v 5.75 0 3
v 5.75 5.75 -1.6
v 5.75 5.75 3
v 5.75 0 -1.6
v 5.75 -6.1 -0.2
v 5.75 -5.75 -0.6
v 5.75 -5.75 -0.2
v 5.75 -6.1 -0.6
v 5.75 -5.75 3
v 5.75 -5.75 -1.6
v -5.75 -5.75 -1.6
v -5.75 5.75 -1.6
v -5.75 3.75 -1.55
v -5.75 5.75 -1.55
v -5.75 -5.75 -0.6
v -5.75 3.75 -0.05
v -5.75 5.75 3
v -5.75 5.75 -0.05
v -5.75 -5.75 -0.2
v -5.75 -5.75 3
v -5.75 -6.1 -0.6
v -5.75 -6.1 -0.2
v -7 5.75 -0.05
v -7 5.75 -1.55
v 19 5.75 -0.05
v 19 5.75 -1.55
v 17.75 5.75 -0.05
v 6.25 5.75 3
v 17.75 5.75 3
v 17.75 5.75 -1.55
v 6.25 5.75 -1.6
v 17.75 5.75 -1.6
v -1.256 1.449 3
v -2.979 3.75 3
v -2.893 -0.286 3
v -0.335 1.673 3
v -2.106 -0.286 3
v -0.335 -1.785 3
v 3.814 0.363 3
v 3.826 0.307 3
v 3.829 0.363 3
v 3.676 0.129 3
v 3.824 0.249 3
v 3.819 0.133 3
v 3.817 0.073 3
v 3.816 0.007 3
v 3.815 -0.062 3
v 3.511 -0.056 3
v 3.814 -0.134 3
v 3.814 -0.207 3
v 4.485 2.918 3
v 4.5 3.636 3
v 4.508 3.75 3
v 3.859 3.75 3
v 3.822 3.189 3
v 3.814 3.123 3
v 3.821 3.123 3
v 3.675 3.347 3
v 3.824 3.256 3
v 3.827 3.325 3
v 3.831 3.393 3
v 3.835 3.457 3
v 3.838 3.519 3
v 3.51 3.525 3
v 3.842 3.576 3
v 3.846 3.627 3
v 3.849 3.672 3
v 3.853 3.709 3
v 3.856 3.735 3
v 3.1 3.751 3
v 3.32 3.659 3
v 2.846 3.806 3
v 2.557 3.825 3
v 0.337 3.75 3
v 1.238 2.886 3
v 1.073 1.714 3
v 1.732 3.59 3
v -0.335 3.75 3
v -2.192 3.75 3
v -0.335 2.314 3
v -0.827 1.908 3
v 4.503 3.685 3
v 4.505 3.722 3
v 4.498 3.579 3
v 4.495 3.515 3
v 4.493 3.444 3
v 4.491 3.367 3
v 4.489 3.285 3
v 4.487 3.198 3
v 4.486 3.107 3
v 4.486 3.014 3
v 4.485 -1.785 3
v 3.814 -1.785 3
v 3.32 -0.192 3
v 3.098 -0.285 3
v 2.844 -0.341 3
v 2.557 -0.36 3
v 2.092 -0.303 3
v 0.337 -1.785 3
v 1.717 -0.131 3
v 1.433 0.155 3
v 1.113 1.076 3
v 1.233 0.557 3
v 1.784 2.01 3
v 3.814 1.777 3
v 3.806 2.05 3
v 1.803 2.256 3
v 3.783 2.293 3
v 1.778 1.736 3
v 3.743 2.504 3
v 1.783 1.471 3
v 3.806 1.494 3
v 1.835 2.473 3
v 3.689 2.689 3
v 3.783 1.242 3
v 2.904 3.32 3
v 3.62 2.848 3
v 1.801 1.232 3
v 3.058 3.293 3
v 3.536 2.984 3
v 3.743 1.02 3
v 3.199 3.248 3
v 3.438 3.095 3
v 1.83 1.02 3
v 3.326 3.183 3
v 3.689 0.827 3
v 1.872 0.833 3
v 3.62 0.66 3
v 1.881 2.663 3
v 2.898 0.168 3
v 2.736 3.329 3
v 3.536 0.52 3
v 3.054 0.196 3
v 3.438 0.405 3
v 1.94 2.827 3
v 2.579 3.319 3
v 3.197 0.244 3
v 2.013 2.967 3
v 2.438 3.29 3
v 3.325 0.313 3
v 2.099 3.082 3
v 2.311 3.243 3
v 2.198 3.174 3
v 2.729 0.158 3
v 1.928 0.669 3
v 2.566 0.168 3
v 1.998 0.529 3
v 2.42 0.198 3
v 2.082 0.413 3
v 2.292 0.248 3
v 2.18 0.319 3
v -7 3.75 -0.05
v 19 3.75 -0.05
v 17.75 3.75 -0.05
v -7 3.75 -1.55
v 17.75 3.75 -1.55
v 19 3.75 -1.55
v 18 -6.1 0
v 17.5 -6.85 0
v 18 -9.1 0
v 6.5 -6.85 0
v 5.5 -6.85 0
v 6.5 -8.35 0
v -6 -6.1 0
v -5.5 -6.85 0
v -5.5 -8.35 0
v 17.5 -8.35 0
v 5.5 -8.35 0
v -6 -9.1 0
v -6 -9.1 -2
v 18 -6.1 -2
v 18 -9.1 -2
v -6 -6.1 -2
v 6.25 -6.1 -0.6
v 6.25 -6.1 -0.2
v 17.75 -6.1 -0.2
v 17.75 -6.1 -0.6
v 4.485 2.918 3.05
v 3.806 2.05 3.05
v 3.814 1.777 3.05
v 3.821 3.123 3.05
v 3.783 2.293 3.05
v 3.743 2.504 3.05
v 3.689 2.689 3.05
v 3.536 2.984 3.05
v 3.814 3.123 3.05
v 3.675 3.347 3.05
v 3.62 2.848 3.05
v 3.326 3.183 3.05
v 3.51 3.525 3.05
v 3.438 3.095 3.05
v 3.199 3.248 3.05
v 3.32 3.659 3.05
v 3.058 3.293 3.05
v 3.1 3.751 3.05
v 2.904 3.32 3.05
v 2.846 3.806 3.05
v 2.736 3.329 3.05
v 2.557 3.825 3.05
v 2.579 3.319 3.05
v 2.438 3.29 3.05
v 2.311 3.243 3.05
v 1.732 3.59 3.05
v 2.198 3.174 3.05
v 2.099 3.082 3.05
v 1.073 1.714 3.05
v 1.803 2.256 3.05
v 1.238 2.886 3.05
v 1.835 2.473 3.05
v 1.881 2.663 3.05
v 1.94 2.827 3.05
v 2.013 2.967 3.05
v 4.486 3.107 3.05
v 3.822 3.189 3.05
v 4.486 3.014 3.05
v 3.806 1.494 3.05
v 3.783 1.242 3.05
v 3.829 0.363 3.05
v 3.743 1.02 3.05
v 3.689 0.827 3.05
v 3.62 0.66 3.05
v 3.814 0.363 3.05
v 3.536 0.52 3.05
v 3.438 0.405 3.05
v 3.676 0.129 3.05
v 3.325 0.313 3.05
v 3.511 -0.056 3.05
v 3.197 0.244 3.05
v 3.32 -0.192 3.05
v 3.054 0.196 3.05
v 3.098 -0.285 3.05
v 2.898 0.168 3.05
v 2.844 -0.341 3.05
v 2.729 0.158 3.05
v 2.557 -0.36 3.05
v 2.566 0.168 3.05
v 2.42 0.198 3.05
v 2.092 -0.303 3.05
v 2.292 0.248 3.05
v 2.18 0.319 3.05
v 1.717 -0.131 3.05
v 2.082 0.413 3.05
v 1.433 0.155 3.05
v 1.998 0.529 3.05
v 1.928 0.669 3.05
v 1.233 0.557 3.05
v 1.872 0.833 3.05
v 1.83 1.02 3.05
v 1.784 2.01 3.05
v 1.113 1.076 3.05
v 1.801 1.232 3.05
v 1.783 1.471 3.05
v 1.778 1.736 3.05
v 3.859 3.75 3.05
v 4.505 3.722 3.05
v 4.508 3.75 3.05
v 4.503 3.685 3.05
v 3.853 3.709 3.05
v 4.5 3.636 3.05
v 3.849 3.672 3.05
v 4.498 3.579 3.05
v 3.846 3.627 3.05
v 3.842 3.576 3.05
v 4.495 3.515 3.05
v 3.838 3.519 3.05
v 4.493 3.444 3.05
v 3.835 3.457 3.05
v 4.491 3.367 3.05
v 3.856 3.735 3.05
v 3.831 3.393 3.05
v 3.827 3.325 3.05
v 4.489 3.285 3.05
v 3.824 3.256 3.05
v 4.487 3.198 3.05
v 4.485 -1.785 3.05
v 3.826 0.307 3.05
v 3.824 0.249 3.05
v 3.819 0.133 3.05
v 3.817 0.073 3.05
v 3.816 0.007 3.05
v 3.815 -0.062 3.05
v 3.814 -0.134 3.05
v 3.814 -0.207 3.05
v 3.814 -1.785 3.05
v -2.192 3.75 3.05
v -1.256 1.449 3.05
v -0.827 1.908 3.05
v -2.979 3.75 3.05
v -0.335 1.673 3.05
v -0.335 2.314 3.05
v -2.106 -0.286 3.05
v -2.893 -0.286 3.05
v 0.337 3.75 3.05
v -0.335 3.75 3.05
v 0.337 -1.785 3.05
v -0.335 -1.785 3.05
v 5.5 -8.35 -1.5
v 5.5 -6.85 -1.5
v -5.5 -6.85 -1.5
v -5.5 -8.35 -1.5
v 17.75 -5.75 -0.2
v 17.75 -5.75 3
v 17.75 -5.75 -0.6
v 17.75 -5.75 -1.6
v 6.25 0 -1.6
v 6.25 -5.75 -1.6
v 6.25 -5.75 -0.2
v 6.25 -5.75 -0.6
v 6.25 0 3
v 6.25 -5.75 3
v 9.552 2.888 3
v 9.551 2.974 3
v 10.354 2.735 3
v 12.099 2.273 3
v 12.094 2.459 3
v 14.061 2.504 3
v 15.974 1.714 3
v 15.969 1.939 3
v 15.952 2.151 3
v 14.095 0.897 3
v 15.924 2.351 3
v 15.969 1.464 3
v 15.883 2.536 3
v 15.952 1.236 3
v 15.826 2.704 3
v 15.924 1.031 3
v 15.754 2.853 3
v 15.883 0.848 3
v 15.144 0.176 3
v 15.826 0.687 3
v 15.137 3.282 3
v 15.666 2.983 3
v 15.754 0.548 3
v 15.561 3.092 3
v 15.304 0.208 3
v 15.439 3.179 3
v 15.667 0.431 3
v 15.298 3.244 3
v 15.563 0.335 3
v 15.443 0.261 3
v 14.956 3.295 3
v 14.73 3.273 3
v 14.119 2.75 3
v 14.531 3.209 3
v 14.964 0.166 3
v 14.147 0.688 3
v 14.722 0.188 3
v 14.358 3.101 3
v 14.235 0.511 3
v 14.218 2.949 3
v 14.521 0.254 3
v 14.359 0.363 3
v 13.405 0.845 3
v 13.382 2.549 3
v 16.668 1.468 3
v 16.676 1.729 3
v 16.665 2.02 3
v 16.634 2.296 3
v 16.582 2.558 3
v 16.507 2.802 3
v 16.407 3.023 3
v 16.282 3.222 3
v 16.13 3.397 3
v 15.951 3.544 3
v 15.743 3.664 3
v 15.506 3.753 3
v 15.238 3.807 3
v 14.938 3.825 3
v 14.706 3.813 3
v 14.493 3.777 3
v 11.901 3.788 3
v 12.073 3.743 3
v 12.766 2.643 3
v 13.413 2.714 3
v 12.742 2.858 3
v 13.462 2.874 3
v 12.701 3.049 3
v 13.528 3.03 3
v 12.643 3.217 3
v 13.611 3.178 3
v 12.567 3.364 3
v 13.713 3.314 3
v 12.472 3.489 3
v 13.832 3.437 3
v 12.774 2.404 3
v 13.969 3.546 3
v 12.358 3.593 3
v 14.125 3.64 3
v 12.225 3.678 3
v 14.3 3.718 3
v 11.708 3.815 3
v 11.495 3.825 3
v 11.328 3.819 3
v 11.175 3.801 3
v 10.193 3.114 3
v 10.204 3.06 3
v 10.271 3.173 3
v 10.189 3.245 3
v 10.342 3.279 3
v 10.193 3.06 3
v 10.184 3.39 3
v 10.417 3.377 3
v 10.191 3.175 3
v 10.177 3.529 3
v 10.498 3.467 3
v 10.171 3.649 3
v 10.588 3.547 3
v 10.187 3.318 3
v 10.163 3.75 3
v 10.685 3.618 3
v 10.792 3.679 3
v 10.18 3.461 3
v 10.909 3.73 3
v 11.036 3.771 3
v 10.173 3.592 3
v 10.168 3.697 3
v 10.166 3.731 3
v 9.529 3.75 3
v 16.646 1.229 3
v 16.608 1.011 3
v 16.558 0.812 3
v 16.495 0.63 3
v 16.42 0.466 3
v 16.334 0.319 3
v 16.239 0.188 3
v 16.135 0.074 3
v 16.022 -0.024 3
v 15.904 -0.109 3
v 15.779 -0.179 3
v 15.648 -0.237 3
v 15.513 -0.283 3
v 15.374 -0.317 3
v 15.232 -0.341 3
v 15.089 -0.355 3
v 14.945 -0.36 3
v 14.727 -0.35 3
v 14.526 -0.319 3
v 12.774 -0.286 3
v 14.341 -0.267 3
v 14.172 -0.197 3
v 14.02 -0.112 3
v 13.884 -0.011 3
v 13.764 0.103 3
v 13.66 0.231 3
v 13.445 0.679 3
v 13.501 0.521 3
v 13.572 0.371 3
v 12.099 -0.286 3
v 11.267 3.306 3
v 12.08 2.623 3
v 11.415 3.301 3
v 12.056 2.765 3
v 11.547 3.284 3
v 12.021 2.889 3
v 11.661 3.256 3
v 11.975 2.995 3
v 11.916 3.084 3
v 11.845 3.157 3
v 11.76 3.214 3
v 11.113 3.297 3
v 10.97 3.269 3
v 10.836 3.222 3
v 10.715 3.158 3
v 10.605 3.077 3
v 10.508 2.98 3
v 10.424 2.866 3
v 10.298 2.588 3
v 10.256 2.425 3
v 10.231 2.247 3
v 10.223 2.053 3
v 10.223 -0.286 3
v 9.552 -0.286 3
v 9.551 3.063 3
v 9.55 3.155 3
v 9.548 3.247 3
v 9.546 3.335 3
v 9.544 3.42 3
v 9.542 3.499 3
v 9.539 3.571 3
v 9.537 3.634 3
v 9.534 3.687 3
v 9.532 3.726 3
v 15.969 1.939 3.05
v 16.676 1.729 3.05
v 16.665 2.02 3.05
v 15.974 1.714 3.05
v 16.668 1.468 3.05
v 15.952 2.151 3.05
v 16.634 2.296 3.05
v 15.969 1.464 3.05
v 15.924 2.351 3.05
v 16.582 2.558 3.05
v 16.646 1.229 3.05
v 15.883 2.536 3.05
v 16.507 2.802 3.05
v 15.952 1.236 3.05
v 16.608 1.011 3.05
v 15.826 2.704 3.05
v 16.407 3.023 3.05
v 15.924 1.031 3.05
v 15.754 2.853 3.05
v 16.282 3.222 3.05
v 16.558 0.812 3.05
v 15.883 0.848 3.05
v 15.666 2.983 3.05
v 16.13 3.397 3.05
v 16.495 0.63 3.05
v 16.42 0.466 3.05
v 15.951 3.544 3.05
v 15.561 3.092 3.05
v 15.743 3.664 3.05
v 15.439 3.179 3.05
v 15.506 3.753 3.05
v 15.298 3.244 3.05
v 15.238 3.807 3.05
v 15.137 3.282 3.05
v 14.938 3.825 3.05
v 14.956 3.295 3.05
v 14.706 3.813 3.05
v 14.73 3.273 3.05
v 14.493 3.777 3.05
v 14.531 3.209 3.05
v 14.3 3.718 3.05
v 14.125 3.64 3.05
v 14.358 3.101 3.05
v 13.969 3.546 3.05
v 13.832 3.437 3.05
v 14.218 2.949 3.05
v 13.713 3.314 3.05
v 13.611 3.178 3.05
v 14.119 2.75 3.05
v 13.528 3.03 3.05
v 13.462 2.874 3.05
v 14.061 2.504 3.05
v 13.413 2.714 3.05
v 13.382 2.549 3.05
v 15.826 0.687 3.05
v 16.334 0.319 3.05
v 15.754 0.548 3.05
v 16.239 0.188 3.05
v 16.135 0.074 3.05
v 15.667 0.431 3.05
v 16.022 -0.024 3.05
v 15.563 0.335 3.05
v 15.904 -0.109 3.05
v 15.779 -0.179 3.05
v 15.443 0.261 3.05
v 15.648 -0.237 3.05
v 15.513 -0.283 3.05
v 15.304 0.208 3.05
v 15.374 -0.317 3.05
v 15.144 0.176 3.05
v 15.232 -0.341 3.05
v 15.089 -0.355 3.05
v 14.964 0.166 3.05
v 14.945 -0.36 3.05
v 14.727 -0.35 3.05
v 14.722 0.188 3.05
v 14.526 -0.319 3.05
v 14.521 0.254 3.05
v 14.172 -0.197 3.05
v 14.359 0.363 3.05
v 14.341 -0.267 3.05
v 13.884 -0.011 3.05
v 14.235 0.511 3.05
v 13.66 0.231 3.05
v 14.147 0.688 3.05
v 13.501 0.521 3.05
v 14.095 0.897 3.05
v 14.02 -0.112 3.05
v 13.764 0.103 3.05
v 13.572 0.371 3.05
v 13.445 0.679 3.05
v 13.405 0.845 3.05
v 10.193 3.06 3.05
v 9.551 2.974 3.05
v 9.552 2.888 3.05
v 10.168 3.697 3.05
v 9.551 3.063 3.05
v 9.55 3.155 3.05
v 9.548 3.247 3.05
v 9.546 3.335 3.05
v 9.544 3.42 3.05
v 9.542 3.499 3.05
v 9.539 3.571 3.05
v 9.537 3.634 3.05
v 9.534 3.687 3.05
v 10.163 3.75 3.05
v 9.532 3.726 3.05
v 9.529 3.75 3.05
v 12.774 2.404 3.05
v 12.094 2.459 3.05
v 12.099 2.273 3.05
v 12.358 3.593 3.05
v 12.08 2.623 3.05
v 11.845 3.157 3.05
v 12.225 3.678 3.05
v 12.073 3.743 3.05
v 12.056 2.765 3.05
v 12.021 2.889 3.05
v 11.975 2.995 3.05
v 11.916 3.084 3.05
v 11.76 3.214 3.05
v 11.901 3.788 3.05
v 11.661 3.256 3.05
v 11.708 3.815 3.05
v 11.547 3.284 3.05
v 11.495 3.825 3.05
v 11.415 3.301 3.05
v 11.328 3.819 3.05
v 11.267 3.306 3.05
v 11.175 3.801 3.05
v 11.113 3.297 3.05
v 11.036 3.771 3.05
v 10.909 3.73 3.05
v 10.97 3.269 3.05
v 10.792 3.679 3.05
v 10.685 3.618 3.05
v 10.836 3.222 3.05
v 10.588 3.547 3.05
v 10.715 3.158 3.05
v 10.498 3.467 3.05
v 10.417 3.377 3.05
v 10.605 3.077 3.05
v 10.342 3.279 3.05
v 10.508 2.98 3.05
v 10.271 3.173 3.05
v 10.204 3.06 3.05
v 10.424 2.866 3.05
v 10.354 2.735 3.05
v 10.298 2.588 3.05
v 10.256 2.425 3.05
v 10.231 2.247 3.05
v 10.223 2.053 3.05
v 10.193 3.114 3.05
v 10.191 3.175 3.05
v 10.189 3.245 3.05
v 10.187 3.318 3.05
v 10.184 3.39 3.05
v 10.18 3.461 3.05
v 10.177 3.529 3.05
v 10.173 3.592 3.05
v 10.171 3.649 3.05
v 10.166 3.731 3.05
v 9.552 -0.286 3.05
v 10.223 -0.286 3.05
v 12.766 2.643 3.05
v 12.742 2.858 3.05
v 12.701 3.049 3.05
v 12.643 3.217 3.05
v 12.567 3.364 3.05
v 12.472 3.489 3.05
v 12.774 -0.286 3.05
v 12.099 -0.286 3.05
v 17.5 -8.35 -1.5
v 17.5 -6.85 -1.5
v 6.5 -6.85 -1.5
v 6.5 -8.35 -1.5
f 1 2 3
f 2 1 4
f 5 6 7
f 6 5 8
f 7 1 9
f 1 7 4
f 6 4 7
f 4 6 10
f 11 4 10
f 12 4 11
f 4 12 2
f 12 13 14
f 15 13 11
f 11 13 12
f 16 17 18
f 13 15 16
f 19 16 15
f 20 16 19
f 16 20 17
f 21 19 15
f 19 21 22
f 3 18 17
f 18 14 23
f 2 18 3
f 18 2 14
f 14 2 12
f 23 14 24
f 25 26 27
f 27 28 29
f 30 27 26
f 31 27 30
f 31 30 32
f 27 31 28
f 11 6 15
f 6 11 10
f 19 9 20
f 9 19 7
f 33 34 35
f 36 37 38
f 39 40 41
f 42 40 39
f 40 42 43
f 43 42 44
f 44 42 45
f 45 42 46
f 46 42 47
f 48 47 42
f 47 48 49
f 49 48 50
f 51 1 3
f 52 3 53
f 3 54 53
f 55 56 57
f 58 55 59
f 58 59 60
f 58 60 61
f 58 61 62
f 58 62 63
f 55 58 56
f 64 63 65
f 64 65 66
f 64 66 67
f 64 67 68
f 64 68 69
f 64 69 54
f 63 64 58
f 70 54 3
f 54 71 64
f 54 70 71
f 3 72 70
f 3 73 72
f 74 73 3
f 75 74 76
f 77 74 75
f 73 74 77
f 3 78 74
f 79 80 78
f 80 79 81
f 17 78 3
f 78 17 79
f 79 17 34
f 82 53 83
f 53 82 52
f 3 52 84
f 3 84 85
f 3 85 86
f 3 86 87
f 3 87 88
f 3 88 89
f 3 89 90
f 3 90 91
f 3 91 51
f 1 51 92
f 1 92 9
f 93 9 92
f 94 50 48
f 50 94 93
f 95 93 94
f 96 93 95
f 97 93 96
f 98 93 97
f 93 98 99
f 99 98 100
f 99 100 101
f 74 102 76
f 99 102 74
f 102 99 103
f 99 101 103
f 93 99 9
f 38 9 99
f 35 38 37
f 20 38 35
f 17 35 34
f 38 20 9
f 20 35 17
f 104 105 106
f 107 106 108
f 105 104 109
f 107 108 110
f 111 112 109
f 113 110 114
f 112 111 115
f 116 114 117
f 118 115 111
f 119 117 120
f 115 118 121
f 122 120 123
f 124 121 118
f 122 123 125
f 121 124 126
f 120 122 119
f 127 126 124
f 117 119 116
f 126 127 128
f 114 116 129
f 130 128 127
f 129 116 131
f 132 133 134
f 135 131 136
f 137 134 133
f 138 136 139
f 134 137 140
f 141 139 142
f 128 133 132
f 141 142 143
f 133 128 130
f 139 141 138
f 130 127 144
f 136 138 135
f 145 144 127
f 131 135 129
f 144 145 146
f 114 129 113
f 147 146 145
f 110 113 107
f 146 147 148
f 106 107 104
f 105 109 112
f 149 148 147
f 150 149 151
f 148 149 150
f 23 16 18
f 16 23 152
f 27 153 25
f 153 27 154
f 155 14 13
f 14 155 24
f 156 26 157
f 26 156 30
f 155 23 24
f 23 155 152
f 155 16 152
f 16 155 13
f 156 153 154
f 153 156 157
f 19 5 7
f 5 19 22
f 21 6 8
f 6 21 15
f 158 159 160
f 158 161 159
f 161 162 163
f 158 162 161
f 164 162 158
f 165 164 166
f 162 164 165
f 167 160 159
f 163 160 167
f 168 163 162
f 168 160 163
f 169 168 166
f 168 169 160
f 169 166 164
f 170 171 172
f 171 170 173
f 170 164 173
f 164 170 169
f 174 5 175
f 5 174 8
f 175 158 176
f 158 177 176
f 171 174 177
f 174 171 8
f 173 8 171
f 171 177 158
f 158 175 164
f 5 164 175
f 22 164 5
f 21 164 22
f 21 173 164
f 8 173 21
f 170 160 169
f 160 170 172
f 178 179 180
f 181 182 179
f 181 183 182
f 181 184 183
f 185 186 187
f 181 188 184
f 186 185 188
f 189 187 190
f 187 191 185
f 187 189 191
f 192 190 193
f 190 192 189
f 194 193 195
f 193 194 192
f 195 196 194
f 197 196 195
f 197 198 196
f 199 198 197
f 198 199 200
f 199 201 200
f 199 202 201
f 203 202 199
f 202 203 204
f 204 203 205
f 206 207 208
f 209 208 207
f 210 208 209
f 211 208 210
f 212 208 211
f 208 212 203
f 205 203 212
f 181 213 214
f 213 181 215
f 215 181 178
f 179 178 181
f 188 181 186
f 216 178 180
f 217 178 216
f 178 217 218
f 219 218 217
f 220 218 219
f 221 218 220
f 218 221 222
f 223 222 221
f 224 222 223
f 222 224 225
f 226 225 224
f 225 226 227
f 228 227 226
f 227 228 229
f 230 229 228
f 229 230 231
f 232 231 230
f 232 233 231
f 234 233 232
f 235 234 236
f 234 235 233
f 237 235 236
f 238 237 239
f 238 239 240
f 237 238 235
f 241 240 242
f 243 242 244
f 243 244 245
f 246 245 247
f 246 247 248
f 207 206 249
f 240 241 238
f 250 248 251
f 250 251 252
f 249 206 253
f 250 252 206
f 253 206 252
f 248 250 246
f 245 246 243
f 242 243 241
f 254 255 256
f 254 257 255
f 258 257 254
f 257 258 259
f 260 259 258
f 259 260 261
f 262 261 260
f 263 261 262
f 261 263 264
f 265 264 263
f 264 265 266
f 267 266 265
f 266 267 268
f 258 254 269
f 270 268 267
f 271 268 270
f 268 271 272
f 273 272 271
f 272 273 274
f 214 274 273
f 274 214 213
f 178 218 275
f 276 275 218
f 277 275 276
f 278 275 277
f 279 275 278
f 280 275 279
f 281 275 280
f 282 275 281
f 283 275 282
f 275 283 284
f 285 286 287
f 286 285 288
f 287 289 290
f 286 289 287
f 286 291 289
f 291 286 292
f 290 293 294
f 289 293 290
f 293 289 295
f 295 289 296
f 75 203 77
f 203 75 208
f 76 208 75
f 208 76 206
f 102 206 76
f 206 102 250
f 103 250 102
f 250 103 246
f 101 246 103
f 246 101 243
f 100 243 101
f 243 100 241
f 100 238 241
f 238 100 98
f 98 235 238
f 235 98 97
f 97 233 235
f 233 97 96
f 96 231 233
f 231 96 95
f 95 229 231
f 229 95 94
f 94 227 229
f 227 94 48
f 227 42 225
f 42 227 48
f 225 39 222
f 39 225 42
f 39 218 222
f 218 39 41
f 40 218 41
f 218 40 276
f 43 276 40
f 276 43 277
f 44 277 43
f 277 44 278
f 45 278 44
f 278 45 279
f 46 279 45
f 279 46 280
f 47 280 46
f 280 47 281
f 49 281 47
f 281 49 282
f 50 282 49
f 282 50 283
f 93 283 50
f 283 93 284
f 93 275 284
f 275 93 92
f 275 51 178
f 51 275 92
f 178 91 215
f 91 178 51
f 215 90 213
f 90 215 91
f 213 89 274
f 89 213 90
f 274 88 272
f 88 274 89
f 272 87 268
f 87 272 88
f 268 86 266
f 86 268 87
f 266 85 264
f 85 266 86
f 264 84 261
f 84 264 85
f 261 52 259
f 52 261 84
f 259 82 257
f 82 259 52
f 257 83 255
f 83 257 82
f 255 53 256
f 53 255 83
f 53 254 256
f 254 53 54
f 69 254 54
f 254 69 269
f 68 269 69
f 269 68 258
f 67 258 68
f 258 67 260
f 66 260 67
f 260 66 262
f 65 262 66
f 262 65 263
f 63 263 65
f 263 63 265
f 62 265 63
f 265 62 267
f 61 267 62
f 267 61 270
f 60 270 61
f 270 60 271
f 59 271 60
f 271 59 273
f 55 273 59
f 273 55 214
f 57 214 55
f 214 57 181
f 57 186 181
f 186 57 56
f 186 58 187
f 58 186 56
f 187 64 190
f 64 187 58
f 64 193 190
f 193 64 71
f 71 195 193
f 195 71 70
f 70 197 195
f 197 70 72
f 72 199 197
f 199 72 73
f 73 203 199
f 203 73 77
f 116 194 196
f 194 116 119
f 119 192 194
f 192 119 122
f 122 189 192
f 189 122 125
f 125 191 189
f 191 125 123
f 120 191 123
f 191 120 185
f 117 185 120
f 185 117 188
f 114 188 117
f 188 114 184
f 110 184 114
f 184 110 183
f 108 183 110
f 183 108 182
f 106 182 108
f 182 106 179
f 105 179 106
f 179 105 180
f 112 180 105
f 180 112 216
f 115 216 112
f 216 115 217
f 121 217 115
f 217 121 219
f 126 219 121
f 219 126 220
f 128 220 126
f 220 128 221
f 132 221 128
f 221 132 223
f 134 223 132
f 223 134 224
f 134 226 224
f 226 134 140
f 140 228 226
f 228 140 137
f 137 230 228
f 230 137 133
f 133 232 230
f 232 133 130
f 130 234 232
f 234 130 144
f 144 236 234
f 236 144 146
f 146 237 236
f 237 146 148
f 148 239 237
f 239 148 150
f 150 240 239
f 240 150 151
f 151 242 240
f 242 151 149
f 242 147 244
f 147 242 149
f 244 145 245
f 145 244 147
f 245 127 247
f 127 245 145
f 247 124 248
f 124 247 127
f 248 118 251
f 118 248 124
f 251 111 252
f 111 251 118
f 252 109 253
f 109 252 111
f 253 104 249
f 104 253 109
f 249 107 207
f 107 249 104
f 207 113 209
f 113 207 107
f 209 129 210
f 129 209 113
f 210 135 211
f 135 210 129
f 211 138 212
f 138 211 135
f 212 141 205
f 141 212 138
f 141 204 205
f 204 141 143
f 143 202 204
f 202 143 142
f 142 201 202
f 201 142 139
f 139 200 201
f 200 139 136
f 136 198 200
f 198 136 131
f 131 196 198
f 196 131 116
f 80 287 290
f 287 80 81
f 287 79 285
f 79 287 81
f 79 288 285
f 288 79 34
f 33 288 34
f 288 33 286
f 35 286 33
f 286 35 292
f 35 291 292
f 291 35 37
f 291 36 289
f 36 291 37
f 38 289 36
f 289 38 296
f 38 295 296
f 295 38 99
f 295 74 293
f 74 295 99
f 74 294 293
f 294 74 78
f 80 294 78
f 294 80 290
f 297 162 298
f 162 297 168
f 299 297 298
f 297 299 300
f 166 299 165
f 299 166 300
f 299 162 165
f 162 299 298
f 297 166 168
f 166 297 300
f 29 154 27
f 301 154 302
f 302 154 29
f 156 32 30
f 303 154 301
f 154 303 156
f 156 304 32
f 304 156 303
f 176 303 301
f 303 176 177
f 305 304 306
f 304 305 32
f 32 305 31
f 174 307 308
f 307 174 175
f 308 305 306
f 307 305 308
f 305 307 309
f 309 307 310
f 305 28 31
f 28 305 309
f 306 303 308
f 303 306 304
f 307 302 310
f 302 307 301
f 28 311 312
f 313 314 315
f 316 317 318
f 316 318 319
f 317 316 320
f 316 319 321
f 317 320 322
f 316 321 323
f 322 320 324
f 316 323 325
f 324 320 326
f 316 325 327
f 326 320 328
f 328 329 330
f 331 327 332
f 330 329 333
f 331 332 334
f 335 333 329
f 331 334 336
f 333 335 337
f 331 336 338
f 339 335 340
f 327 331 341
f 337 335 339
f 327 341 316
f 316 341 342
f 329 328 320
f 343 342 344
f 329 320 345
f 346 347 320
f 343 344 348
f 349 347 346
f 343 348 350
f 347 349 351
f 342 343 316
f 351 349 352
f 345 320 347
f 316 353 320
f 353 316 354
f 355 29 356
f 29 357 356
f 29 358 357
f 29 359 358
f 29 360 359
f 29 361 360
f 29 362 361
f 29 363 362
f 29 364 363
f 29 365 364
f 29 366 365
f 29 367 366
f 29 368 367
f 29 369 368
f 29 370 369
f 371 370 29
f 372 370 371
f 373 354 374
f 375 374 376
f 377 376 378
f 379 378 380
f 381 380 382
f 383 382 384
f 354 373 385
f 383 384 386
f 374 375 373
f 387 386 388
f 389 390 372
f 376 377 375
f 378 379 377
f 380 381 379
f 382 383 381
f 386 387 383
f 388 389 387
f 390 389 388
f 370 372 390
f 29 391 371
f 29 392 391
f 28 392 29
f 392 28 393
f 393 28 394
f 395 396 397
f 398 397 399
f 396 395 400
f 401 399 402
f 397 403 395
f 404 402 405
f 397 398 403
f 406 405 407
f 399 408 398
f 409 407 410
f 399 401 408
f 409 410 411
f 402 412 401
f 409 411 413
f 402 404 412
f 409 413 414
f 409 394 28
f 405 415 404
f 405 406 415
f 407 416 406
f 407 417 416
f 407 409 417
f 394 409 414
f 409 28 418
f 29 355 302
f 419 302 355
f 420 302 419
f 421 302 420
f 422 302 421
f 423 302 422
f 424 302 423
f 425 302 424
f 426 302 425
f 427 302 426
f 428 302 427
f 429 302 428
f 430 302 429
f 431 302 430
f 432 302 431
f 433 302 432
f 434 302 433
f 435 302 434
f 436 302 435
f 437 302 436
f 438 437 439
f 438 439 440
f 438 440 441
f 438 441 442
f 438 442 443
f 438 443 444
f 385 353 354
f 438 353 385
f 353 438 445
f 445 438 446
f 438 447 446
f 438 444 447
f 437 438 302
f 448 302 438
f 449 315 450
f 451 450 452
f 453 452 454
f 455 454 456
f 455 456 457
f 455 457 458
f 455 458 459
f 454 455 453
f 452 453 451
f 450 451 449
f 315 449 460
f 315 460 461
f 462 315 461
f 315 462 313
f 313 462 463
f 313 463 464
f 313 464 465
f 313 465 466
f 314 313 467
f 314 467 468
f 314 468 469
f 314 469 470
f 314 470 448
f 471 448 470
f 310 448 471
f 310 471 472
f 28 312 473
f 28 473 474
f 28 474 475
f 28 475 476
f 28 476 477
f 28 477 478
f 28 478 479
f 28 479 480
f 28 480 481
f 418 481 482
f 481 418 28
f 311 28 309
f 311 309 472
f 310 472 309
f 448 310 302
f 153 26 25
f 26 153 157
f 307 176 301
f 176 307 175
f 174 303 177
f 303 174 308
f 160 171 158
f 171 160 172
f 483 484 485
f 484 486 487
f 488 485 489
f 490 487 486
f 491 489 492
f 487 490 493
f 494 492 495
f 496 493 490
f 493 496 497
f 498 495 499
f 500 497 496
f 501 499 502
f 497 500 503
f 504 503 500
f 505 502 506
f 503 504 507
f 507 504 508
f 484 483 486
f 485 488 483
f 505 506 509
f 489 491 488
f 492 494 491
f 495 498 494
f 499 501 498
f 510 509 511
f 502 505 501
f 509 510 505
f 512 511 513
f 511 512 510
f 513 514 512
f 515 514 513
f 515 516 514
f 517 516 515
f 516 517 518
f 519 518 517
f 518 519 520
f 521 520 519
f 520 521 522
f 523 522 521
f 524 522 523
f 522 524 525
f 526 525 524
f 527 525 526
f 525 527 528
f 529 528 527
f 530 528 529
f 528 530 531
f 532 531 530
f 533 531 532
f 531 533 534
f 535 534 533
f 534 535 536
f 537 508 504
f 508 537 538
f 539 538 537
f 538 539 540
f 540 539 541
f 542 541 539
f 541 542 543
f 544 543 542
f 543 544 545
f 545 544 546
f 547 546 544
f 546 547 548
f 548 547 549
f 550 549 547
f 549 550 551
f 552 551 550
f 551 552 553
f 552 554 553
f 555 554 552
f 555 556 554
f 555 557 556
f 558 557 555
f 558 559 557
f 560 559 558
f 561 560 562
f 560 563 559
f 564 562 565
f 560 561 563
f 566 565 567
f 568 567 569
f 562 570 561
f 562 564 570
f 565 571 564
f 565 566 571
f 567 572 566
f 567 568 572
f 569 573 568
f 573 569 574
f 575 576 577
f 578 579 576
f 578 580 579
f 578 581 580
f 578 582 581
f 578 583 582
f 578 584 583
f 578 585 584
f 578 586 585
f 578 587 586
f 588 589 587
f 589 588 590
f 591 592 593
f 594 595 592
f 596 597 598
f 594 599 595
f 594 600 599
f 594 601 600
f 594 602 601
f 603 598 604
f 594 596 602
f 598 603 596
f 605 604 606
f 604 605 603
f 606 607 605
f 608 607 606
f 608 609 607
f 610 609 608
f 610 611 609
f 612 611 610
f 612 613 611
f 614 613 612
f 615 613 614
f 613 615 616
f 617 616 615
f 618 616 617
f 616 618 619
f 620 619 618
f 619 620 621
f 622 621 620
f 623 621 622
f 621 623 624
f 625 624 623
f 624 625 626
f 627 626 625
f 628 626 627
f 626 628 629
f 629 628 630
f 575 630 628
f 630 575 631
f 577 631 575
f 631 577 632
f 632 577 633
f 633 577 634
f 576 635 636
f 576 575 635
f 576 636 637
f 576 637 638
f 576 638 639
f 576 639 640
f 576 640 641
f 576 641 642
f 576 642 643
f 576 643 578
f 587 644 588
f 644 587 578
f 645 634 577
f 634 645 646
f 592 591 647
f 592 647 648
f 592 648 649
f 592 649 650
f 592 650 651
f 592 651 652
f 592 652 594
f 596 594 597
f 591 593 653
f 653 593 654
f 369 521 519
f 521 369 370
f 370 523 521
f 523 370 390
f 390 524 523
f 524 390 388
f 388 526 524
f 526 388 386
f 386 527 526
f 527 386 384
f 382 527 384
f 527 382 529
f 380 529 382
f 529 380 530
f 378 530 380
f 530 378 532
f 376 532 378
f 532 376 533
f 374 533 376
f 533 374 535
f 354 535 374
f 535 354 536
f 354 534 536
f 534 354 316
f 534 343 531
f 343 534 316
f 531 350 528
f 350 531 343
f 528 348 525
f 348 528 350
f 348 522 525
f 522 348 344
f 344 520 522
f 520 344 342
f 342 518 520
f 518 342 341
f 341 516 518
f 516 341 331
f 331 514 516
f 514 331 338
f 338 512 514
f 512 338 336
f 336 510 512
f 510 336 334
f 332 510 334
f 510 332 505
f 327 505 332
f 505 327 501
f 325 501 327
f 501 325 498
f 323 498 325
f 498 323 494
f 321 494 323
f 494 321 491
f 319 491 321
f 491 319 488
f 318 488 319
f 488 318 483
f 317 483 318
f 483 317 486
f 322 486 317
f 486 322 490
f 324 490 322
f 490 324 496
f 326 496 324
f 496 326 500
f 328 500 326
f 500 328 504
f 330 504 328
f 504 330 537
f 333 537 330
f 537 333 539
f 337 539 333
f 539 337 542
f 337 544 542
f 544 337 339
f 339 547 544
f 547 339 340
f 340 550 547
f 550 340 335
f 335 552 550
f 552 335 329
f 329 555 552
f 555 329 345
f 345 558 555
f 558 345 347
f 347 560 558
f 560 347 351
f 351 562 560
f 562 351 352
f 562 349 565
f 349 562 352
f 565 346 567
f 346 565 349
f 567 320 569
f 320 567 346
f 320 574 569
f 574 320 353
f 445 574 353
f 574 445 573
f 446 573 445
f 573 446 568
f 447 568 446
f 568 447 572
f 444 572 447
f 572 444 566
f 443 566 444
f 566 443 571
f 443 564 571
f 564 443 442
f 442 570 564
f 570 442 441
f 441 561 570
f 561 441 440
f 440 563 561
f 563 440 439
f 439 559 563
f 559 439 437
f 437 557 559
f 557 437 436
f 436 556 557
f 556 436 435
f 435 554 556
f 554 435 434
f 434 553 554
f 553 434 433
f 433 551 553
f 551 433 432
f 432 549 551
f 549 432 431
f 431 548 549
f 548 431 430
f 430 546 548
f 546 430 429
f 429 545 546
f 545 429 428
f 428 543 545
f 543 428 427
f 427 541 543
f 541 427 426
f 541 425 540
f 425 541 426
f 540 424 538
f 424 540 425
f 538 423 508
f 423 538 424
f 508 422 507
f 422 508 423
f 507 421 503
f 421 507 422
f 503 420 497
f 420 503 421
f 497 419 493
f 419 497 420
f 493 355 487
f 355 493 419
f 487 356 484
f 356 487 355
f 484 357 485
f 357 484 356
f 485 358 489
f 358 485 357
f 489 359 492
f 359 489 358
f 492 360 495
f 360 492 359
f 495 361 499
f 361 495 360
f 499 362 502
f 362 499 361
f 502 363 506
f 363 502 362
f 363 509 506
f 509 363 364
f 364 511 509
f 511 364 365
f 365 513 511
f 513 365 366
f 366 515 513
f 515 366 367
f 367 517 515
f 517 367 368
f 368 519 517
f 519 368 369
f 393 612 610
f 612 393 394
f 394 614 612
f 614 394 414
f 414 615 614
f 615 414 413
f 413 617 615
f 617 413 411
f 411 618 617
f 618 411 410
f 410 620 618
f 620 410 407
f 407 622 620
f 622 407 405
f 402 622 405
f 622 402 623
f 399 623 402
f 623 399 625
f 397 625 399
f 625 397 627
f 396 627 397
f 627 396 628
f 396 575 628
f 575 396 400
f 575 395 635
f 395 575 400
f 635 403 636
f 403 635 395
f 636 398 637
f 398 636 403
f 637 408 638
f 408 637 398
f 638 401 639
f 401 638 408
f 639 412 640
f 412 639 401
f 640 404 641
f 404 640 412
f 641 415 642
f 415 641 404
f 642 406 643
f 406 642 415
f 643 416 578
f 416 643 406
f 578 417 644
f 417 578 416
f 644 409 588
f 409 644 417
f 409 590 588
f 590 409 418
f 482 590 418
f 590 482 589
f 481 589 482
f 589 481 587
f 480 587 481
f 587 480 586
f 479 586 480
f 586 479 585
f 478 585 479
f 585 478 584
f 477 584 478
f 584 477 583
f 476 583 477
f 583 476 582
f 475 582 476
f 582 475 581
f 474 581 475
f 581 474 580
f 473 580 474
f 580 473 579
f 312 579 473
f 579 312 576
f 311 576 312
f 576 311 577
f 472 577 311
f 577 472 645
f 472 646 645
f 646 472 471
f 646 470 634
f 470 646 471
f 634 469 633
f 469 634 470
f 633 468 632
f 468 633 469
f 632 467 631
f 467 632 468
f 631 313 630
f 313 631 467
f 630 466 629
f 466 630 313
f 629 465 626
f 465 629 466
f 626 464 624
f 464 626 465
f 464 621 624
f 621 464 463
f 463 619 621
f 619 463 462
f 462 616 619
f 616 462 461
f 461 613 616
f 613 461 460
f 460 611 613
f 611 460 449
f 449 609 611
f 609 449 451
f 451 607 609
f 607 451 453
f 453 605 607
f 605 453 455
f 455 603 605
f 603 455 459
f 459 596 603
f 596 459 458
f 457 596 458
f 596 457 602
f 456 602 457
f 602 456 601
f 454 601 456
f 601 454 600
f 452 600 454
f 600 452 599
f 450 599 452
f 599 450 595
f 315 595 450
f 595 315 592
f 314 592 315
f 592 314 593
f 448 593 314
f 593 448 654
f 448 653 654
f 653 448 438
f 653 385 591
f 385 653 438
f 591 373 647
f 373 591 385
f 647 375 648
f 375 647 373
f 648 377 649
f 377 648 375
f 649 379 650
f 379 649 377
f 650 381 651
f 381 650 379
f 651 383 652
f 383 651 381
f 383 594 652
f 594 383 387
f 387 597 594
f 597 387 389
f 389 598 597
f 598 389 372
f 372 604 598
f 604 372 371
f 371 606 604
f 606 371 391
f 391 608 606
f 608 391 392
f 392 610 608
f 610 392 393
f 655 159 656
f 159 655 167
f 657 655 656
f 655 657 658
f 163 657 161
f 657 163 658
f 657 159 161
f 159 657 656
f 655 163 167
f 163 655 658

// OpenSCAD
numb=2;
cap=["bk","cu"];

difference() {

   for (i=[0:numb-1])
   {

difference() {

   union () {
    translate ([i*12,0,-1.5+1.4]) cube ( [11.5,11.5,3], center = true ); //buttons below panel

    translate ([i*12,0,-1.5+3]) cube ( [11.5,11.5,3], center = true ); //buttons above panel

    translate ([i*12,4.75,-0.8]) cube ( [14,2,1.5], center = true ); //stop below

    translate ([i*12,-6.5,-0.4]) cube ( [11.5,3,0.4], center = true ); //hinge

    translate ([i*12,-7.6,-1]) cube ( [12,3,2], center = true ); //mount bar

    translate([i*12+5, 3.75, 2.65]) linear_extrude(0.4) rotate([0,0,180]) text(cap[i],size=5.5);



   //translate ([0,-8.5,0.7]) cube ( [49,4,1.4], center = true ); //buttons

   //translate ([0,-6.5,-0.4]) cube ( [49,4,3], center = true ); //buttons


   };



   translate ([i*12,-7.6,-0.75]) cube ( [11,1.5,1.5], center = true ); //locating recess



   };

   
};

   translate ([6,6,2]) cube ( [0.5,12,12], center = true ); //locating recess


};
